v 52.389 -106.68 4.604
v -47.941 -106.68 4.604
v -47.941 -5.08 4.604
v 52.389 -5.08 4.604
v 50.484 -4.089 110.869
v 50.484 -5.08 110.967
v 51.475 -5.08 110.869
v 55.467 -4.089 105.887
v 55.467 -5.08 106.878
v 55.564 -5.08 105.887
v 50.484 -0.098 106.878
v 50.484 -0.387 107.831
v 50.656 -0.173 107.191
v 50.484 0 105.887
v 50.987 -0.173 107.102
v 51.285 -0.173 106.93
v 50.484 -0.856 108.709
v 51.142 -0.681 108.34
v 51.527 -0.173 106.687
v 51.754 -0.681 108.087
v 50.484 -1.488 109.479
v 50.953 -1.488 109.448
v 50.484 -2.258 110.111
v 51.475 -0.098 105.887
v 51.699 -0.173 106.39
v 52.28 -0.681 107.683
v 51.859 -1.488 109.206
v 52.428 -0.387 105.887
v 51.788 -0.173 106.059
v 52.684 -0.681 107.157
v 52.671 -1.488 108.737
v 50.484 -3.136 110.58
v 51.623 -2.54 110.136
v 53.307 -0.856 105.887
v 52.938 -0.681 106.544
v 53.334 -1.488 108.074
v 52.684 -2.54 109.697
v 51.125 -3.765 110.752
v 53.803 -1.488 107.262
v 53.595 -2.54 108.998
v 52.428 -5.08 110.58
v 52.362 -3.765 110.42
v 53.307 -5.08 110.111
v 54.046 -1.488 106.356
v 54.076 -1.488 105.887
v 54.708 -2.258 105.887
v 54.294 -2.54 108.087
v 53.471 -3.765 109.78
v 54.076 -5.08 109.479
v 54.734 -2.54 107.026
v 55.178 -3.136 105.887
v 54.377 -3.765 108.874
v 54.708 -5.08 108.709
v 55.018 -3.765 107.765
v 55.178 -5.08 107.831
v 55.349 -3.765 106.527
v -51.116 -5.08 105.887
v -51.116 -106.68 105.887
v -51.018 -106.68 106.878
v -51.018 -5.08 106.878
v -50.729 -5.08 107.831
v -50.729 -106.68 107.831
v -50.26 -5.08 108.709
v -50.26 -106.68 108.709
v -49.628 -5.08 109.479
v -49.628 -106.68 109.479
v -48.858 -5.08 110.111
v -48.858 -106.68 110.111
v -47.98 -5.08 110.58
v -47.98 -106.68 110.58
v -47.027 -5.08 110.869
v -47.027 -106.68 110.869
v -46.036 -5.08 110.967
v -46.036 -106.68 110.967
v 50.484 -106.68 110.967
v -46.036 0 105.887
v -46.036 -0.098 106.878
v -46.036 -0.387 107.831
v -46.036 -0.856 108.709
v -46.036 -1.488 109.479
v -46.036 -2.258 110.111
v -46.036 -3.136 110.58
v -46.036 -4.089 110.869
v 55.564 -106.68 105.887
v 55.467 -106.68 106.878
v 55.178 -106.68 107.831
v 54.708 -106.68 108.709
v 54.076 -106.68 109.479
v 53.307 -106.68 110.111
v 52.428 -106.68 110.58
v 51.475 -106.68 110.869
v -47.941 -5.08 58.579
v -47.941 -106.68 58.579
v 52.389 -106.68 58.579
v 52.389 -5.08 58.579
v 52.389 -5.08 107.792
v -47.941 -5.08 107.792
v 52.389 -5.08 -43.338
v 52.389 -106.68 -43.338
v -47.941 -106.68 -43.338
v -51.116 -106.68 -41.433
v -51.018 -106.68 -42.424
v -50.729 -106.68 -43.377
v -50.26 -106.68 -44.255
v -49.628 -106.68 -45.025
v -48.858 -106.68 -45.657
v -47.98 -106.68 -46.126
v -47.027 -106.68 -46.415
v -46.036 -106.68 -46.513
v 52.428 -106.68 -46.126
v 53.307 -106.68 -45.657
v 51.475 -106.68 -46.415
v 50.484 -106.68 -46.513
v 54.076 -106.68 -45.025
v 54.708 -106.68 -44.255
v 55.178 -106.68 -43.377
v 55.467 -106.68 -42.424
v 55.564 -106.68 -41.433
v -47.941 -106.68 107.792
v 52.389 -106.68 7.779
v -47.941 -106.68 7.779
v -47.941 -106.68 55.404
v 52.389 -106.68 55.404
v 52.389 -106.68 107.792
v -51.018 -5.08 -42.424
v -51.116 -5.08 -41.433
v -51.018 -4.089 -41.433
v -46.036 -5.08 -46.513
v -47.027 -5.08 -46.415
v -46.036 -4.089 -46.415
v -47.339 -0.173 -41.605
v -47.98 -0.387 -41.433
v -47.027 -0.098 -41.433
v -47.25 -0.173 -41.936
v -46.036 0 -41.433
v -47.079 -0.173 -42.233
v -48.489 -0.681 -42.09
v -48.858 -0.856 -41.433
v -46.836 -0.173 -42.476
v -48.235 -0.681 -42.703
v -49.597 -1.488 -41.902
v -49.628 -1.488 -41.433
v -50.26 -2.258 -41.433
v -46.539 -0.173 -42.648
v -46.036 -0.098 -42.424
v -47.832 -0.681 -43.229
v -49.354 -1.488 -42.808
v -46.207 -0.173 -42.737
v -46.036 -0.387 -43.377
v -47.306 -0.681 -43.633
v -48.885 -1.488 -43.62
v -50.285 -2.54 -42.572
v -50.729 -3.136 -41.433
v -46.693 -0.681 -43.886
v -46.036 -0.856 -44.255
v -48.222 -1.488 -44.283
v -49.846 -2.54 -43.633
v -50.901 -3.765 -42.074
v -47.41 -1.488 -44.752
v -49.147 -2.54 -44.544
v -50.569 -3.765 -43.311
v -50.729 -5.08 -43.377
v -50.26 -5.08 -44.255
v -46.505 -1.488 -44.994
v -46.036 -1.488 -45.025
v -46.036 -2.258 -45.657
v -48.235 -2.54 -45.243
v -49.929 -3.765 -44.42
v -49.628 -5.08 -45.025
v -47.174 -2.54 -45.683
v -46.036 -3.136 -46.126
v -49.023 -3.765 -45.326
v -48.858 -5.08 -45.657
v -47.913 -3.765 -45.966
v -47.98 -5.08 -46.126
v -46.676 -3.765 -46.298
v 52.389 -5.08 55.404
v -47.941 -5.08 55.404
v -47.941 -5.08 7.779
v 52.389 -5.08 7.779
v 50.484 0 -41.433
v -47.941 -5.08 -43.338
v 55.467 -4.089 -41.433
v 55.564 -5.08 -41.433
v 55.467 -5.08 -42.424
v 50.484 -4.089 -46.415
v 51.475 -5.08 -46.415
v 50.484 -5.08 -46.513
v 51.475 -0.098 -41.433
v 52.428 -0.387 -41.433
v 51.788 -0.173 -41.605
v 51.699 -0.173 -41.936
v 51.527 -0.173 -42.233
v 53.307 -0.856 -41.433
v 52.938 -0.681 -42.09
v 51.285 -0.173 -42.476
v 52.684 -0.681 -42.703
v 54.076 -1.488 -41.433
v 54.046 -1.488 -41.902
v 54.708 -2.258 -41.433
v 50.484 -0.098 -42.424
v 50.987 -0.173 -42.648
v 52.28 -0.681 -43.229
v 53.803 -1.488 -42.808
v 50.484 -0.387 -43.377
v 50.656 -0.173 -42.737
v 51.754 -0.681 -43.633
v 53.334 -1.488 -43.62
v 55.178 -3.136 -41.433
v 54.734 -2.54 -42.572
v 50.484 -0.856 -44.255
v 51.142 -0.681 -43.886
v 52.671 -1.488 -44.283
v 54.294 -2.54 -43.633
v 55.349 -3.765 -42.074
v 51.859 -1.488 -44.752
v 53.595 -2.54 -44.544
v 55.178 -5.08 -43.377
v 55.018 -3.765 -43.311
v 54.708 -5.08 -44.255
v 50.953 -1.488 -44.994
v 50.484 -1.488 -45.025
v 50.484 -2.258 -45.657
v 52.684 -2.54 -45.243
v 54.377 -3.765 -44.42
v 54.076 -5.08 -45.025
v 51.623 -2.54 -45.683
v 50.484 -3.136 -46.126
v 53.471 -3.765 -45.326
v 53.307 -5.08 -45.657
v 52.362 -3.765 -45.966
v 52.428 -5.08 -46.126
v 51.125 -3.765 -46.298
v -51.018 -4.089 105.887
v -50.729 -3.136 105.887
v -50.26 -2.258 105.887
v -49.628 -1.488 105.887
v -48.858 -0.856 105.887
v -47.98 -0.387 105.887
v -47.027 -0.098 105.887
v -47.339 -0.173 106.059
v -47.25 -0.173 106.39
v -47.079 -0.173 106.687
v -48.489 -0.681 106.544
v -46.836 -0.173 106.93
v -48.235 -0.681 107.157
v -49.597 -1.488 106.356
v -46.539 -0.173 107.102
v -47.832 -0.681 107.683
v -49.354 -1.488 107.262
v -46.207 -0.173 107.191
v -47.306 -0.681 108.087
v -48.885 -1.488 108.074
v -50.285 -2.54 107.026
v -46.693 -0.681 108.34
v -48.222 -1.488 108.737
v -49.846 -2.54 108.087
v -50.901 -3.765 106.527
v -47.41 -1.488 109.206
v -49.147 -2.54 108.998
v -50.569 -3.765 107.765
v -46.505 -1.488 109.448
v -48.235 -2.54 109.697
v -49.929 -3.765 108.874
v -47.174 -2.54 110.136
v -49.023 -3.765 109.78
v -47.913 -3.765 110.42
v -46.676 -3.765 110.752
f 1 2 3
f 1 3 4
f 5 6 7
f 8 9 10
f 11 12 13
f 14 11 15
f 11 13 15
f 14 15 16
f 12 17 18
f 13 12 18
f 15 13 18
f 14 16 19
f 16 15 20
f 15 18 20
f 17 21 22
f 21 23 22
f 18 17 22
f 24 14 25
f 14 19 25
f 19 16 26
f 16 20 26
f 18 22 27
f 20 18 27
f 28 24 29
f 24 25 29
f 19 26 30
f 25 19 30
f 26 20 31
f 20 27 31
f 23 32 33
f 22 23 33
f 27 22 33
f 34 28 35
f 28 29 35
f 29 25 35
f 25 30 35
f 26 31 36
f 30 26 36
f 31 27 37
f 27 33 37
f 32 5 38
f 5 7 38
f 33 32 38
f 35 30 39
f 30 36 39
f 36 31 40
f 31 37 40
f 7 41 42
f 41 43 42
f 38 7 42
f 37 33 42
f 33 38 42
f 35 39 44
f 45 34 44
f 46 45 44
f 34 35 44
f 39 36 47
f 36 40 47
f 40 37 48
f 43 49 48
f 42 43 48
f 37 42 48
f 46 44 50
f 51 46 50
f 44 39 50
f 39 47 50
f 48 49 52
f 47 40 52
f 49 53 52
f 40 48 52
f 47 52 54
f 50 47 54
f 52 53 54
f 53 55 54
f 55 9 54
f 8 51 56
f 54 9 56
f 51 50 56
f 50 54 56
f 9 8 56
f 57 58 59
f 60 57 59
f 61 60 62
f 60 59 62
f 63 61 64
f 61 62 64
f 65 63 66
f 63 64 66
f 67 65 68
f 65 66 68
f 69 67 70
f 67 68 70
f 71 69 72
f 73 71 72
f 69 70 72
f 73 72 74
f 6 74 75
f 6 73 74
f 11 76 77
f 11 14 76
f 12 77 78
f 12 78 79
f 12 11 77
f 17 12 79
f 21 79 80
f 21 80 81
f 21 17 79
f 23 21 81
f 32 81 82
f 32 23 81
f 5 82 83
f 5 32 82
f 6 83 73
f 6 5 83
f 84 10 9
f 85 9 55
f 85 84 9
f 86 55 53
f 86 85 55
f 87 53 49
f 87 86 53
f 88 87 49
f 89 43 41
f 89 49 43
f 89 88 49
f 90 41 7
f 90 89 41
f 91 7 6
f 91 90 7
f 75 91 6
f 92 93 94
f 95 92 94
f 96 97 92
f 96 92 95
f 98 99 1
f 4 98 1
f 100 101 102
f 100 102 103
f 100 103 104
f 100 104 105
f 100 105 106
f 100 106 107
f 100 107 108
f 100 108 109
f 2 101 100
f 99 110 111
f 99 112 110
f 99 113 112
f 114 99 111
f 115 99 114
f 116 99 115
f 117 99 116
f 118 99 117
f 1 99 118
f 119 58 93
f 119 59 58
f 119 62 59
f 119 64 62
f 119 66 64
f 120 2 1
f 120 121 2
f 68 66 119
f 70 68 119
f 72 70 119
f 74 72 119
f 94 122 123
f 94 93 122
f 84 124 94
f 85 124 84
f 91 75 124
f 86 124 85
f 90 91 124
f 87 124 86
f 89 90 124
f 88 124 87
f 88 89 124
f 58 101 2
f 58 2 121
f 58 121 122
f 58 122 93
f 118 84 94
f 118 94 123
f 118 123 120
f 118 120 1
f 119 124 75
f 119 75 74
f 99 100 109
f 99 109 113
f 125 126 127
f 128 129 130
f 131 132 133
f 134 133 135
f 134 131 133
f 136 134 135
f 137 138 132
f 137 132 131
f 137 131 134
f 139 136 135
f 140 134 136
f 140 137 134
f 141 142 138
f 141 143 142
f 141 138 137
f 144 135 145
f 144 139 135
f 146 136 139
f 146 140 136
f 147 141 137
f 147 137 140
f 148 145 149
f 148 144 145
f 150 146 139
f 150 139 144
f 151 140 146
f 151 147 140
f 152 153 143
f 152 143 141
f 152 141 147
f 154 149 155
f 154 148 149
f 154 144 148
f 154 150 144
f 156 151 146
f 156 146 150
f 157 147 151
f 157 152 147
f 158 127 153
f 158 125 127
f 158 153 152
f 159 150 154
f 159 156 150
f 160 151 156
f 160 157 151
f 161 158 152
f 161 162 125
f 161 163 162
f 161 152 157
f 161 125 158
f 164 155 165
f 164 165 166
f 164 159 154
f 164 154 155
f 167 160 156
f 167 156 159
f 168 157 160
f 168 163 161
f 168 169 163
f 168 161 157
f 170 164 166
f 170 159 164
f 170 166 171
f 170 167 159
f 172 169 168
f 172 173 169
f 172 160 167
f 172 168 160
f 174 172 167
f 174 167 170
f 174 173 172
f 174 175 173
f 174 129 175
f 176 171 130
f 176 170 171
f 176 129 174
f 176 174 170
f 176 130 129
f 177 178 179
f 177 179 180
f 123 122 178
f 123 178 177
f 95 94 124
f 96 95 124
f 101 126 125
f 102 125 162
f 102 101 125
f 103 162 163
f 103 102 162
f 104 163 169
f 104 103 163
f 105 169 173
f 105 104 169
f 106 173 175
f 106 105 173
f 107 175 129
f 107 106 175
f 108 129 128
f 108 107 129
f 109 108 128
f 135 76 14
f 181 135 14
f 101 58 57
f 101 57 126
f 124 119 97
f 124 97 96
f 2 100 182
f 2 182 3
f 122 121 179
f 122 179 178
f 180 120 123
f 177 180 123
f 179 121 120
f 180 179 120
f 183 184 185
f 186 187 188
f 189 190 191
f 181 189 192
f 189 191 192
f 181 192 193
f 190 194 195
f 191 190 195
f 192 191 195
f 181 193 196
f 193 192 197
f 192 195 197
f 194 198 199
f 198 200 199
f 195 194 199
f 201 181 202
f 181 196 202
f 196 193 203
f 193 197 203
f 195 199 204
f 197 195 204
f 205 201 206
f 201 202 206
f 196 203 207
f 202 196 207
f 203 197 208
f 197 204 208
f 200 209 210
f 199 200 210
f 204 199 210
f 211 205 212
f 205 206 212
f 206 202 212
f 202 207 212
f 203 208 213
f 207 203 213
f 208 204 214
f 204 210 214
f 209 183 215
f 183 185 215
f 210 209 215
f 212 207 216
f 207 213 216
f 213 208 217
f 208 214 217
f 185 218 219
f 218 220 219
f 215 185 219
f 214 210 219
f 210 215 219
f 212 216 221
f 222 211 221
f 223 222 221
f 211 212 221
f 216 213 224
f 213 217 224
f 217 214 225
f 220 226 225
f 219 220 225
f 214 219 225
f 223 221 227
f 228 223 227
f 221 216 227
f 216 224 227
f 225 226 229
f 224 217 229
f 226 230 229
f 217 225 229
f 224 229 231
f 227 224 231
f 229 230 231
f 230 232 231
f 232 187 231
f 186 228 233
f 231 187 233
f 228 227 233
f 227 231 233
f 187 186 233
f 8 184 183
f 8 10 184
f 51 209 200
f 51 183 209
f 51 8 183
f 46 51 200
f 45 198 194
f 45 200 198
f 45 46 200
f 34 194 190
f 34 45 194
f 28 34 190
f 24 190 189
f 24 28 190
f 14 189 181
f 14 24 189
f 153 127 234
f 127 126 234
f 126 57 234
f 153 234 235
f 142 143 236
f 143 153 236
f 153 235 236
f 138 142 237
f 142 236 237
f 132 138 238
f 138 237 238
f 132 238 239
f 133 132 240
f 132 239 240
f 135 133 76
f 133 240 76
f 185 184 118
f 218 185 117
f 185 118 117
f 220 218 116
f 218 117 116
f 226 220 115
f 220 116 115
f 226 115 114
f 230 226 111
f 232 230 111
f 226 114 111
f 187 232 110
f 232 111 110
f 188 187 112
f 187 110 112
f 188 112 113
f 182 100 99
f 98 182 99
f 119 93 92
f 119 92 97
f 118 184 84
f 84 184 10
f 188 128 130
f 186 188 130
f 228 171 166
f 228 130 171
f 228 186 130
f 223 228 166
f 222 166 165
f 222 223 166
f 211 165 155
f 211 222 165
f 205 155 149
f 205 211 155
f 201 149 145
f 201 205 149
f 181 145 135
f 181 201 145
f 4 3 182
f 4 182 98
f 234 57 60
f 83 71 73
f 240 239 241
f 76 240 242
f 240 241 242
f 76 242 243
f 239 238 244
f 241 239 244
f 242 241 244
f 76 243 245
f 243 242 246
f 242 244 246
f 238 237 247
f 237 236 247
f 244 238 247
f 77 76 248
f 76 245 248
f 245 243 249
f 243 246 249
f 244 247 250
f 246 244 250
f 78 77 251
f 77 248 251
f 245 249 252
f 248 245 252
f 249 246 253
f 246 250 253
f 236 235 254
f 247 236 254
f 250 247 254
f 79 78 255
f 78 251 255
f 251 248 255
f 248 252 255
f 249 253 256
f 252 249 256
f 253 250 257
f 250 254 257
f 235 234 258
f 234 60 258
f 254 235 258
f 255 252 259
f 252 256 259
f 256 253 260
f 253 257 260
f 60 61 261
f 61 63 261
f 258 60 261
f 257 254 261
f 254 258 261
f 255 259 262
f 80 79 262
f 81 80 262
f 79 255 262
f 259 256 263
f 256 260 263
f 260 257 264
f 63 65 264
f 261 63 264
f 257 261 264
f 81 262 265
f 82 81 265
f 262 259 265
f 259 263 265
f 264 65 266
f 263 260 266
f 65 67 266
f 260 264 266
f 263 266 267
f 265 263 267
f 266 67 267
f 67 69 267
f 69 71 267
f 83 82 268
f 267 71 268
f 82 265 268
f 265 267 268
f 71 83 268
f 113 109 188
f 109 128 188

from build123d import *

# Parameters (mm, degrees)
F0_W     = 106.68
F0_H     = 157.48
F1_DEPTH = 106.68
F2_W     = 100.33
F2_H     = 151.13
F3_DEPTH = 101.6
F4_W     = 106.68
F4_H     = 1.5875
F5_DEPTH = 101.6
F6_R     = 5.08


with BuildPart() as f1:
    # F0 (on Front) → F1 (new body)
    with BuildSketch(Plane.XZ):
        with Locations((2.224307, 32.226964)):
            Rectangle(F0_W, F0_H)
    extrude(amount=F1_DEPTH)

    # F2 (on face) → F3 (cut)
    with BuildSketch(Plane.XZ.offset(106.68)):
        with Locations((2.224307, 32.226964)):
            Rectangle(F2_W, F2_H)
    extrude(amount=-F3_DEPTH, mode=Mode.SUBTRACT)

    # F4 (on face) → F5 (join)
    with BuildSketch(Plane.XZ.offset(106.68)):
        with Locations((2.224307, 56.198214)):
            Rectangle(F4_W, F4_H)
        with Locations((2.224307, 57.785714)):
            Rectangle(F4_W, F4_H)
        with Locations((2.224307, 6.985714)):
            Rectangle(F4_W, F4_H)
        with Locations((2.224307, 5.398214)):
            Rectangle(F4_W, F4_H)
    extrude(amount=-F5_DEPTH)

    # F6
    f6_edges = [f1.edges().sort_by_distance(p)[0] for p in [
        (55.564307, -53.34, 110.966964),
        (-51.115693, -53.34, 110.966964),
        (55.564307, -53.34, -46.513036),
        (-51.115693, -53.34, -46.513036),
        (-51.115693, 0, 32.226964),
        (2.224307, 0, 110.966964),
        (55.564307, 0, 32.226964),
        (2.224307, 0, -46.513036),
    ]]
    fillet(f6_edges, radius=F6_R)


solid = f1.part
